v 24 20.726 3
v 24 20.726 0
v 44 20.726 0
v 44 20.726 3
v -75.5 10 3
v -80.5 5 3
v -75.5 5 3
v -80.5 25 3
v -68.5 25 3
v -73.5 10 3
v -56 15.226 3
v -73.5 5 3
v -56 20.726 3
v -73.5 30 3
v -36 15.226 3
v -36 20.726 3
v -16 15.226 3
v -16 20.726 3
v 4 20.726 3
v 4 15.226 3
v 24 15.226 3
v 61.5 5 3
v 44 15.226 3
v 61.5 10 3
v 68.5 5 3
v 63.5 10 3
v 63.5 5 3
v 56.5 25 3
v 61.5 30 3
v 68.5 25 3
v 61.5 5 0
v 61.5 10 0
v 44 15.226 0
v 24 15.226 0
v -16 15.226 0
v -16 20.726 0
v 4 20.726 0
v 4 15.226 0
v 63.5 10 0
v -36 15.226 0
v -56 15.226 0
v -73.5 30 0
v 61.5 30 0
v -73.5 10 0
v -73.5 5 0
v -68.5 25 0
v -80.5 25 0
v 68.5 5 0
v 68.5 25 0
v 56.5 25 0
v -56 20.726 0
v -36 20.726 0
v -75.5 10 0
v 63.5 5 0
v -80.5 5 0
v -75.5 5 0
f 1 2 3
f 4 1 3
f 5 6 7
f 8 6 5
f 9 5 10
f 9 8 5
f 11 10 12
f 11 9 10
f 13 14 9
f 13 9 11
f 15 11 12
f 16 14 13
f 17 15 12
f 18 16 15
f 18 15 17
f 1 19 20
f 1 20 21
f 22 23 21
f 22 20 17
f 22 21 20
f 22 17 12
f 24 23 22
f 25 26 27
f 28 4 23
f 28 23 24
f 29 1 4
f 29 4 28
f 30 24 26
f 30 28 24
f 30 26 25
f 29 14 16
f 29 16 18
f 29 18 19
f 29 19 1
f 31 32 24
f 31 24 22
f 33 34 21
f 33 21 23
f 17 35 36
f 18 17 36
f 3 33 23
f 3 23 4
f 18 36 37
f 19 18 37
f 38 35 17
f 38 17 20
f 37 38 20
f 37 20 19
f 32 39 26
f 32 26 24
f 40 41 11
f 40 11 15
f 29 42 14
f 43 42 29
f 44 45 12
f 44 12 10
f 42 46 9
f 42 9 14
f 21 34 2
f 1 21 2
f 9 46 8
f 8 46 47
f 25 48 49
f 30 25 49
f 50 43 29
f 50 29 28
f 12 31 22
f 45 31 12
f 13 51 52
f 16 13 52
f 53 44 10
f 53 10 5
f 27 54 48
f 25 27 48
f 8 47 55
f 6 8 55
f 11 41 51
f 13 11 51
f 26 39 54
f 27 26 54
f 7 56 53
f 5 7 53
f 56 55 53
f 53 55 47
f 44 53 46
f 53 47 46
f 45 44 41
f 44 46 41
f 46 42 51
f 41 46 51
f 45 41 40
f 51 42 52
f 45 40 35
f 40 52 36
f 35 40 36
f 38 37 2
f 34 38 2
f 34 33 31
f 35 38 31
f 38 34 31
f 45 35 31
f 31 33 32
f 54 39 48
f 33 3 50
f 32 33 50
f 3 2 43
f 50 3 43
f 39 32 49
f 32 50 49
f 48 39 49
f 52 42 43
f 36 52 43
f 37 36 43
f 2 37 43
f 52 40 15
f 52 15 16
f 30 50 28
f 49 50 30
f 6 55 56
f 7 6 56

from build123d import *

# Parameters (mm, degrees)
EXTRUDE_1_DEPTH         = 3
CUT_EXTRUDE_START       = -3
CUT_EXTRUDE_1_OUTLINE_W = 20
CUT_EXTRUDE_1_OUTLINE_H = 5.5
CUT_EXTRUDE_1_DEPTH     = 3
CUT_EXTRUDE_1_2_DEPTH   = 3


# Read off the part's stored shape, not the designer's step: 切除-拉伸1
with BuildPart() as part:
    # 草图1 → 凸台-拉伸1 (new body)
    with BuildSketch(Plane.XY):
        Polygon((-78.5, 25), (-68.5, 25), (-73.5, 30), (61.5, 30), (56.5, 25), (66.5, 25), (66.5, 10), (61.5, 10), (61.5, 5), (-73.5, 5), (-73.5, 10), (-78.5, 10), align=None)
    extrude(amount=EXTRUDE_1_DEPTH)

    # 切除-拉伸1 outline → 切除-拉伸1 (cut)
    with BuildSketch(Plane.XY.offset(3).offset(CUT_EXTRUDE_START)):
        with Locations((-6, 17.975640355)):
            Rectangle(CUT_EXTRUDE_1_OUTLINE_W, CUT_EXTRUDE_1_OUTLINE_H)
        with Locations((-46, 17.975640355)):
            Rectangle(CUT_EXTRUDE_1_OUTLINE_W, CUT_EXTRUDE_1_OUTLINE_H)
        with Locations((34, 17.975640355)):
            Rectangle(CUT_EXTRUDE_1_OUTLINE_W, CUT_EXTRUDE_1_OUTLINE_H)
    extrude(amount=CUT_EXTRUDE_1_DEPTH, mode=Mode.SUBTRACT)

    # Cut-Extrude 1 2 outline → Cut-Extrude 1 2 (add)
    with BuildSketch(Plane.XY.offset(3).offset(CUT_EXTRUDE_START)):
        Polygon((-78.5, 25), (-80.5, 25), (-80.5, 5), (-75.5, 5), (-75.5, 10), (-78.5, 10), align=None)
        Polygon((68.5, 25), (66.5, 25), (66.5, 10), (63.5, 10), (63.5, 5), (68.5, 5), align=None)
    extrude(amount=CUT_EXTRUDE_1_2_DEPTH)


solid = part.part
